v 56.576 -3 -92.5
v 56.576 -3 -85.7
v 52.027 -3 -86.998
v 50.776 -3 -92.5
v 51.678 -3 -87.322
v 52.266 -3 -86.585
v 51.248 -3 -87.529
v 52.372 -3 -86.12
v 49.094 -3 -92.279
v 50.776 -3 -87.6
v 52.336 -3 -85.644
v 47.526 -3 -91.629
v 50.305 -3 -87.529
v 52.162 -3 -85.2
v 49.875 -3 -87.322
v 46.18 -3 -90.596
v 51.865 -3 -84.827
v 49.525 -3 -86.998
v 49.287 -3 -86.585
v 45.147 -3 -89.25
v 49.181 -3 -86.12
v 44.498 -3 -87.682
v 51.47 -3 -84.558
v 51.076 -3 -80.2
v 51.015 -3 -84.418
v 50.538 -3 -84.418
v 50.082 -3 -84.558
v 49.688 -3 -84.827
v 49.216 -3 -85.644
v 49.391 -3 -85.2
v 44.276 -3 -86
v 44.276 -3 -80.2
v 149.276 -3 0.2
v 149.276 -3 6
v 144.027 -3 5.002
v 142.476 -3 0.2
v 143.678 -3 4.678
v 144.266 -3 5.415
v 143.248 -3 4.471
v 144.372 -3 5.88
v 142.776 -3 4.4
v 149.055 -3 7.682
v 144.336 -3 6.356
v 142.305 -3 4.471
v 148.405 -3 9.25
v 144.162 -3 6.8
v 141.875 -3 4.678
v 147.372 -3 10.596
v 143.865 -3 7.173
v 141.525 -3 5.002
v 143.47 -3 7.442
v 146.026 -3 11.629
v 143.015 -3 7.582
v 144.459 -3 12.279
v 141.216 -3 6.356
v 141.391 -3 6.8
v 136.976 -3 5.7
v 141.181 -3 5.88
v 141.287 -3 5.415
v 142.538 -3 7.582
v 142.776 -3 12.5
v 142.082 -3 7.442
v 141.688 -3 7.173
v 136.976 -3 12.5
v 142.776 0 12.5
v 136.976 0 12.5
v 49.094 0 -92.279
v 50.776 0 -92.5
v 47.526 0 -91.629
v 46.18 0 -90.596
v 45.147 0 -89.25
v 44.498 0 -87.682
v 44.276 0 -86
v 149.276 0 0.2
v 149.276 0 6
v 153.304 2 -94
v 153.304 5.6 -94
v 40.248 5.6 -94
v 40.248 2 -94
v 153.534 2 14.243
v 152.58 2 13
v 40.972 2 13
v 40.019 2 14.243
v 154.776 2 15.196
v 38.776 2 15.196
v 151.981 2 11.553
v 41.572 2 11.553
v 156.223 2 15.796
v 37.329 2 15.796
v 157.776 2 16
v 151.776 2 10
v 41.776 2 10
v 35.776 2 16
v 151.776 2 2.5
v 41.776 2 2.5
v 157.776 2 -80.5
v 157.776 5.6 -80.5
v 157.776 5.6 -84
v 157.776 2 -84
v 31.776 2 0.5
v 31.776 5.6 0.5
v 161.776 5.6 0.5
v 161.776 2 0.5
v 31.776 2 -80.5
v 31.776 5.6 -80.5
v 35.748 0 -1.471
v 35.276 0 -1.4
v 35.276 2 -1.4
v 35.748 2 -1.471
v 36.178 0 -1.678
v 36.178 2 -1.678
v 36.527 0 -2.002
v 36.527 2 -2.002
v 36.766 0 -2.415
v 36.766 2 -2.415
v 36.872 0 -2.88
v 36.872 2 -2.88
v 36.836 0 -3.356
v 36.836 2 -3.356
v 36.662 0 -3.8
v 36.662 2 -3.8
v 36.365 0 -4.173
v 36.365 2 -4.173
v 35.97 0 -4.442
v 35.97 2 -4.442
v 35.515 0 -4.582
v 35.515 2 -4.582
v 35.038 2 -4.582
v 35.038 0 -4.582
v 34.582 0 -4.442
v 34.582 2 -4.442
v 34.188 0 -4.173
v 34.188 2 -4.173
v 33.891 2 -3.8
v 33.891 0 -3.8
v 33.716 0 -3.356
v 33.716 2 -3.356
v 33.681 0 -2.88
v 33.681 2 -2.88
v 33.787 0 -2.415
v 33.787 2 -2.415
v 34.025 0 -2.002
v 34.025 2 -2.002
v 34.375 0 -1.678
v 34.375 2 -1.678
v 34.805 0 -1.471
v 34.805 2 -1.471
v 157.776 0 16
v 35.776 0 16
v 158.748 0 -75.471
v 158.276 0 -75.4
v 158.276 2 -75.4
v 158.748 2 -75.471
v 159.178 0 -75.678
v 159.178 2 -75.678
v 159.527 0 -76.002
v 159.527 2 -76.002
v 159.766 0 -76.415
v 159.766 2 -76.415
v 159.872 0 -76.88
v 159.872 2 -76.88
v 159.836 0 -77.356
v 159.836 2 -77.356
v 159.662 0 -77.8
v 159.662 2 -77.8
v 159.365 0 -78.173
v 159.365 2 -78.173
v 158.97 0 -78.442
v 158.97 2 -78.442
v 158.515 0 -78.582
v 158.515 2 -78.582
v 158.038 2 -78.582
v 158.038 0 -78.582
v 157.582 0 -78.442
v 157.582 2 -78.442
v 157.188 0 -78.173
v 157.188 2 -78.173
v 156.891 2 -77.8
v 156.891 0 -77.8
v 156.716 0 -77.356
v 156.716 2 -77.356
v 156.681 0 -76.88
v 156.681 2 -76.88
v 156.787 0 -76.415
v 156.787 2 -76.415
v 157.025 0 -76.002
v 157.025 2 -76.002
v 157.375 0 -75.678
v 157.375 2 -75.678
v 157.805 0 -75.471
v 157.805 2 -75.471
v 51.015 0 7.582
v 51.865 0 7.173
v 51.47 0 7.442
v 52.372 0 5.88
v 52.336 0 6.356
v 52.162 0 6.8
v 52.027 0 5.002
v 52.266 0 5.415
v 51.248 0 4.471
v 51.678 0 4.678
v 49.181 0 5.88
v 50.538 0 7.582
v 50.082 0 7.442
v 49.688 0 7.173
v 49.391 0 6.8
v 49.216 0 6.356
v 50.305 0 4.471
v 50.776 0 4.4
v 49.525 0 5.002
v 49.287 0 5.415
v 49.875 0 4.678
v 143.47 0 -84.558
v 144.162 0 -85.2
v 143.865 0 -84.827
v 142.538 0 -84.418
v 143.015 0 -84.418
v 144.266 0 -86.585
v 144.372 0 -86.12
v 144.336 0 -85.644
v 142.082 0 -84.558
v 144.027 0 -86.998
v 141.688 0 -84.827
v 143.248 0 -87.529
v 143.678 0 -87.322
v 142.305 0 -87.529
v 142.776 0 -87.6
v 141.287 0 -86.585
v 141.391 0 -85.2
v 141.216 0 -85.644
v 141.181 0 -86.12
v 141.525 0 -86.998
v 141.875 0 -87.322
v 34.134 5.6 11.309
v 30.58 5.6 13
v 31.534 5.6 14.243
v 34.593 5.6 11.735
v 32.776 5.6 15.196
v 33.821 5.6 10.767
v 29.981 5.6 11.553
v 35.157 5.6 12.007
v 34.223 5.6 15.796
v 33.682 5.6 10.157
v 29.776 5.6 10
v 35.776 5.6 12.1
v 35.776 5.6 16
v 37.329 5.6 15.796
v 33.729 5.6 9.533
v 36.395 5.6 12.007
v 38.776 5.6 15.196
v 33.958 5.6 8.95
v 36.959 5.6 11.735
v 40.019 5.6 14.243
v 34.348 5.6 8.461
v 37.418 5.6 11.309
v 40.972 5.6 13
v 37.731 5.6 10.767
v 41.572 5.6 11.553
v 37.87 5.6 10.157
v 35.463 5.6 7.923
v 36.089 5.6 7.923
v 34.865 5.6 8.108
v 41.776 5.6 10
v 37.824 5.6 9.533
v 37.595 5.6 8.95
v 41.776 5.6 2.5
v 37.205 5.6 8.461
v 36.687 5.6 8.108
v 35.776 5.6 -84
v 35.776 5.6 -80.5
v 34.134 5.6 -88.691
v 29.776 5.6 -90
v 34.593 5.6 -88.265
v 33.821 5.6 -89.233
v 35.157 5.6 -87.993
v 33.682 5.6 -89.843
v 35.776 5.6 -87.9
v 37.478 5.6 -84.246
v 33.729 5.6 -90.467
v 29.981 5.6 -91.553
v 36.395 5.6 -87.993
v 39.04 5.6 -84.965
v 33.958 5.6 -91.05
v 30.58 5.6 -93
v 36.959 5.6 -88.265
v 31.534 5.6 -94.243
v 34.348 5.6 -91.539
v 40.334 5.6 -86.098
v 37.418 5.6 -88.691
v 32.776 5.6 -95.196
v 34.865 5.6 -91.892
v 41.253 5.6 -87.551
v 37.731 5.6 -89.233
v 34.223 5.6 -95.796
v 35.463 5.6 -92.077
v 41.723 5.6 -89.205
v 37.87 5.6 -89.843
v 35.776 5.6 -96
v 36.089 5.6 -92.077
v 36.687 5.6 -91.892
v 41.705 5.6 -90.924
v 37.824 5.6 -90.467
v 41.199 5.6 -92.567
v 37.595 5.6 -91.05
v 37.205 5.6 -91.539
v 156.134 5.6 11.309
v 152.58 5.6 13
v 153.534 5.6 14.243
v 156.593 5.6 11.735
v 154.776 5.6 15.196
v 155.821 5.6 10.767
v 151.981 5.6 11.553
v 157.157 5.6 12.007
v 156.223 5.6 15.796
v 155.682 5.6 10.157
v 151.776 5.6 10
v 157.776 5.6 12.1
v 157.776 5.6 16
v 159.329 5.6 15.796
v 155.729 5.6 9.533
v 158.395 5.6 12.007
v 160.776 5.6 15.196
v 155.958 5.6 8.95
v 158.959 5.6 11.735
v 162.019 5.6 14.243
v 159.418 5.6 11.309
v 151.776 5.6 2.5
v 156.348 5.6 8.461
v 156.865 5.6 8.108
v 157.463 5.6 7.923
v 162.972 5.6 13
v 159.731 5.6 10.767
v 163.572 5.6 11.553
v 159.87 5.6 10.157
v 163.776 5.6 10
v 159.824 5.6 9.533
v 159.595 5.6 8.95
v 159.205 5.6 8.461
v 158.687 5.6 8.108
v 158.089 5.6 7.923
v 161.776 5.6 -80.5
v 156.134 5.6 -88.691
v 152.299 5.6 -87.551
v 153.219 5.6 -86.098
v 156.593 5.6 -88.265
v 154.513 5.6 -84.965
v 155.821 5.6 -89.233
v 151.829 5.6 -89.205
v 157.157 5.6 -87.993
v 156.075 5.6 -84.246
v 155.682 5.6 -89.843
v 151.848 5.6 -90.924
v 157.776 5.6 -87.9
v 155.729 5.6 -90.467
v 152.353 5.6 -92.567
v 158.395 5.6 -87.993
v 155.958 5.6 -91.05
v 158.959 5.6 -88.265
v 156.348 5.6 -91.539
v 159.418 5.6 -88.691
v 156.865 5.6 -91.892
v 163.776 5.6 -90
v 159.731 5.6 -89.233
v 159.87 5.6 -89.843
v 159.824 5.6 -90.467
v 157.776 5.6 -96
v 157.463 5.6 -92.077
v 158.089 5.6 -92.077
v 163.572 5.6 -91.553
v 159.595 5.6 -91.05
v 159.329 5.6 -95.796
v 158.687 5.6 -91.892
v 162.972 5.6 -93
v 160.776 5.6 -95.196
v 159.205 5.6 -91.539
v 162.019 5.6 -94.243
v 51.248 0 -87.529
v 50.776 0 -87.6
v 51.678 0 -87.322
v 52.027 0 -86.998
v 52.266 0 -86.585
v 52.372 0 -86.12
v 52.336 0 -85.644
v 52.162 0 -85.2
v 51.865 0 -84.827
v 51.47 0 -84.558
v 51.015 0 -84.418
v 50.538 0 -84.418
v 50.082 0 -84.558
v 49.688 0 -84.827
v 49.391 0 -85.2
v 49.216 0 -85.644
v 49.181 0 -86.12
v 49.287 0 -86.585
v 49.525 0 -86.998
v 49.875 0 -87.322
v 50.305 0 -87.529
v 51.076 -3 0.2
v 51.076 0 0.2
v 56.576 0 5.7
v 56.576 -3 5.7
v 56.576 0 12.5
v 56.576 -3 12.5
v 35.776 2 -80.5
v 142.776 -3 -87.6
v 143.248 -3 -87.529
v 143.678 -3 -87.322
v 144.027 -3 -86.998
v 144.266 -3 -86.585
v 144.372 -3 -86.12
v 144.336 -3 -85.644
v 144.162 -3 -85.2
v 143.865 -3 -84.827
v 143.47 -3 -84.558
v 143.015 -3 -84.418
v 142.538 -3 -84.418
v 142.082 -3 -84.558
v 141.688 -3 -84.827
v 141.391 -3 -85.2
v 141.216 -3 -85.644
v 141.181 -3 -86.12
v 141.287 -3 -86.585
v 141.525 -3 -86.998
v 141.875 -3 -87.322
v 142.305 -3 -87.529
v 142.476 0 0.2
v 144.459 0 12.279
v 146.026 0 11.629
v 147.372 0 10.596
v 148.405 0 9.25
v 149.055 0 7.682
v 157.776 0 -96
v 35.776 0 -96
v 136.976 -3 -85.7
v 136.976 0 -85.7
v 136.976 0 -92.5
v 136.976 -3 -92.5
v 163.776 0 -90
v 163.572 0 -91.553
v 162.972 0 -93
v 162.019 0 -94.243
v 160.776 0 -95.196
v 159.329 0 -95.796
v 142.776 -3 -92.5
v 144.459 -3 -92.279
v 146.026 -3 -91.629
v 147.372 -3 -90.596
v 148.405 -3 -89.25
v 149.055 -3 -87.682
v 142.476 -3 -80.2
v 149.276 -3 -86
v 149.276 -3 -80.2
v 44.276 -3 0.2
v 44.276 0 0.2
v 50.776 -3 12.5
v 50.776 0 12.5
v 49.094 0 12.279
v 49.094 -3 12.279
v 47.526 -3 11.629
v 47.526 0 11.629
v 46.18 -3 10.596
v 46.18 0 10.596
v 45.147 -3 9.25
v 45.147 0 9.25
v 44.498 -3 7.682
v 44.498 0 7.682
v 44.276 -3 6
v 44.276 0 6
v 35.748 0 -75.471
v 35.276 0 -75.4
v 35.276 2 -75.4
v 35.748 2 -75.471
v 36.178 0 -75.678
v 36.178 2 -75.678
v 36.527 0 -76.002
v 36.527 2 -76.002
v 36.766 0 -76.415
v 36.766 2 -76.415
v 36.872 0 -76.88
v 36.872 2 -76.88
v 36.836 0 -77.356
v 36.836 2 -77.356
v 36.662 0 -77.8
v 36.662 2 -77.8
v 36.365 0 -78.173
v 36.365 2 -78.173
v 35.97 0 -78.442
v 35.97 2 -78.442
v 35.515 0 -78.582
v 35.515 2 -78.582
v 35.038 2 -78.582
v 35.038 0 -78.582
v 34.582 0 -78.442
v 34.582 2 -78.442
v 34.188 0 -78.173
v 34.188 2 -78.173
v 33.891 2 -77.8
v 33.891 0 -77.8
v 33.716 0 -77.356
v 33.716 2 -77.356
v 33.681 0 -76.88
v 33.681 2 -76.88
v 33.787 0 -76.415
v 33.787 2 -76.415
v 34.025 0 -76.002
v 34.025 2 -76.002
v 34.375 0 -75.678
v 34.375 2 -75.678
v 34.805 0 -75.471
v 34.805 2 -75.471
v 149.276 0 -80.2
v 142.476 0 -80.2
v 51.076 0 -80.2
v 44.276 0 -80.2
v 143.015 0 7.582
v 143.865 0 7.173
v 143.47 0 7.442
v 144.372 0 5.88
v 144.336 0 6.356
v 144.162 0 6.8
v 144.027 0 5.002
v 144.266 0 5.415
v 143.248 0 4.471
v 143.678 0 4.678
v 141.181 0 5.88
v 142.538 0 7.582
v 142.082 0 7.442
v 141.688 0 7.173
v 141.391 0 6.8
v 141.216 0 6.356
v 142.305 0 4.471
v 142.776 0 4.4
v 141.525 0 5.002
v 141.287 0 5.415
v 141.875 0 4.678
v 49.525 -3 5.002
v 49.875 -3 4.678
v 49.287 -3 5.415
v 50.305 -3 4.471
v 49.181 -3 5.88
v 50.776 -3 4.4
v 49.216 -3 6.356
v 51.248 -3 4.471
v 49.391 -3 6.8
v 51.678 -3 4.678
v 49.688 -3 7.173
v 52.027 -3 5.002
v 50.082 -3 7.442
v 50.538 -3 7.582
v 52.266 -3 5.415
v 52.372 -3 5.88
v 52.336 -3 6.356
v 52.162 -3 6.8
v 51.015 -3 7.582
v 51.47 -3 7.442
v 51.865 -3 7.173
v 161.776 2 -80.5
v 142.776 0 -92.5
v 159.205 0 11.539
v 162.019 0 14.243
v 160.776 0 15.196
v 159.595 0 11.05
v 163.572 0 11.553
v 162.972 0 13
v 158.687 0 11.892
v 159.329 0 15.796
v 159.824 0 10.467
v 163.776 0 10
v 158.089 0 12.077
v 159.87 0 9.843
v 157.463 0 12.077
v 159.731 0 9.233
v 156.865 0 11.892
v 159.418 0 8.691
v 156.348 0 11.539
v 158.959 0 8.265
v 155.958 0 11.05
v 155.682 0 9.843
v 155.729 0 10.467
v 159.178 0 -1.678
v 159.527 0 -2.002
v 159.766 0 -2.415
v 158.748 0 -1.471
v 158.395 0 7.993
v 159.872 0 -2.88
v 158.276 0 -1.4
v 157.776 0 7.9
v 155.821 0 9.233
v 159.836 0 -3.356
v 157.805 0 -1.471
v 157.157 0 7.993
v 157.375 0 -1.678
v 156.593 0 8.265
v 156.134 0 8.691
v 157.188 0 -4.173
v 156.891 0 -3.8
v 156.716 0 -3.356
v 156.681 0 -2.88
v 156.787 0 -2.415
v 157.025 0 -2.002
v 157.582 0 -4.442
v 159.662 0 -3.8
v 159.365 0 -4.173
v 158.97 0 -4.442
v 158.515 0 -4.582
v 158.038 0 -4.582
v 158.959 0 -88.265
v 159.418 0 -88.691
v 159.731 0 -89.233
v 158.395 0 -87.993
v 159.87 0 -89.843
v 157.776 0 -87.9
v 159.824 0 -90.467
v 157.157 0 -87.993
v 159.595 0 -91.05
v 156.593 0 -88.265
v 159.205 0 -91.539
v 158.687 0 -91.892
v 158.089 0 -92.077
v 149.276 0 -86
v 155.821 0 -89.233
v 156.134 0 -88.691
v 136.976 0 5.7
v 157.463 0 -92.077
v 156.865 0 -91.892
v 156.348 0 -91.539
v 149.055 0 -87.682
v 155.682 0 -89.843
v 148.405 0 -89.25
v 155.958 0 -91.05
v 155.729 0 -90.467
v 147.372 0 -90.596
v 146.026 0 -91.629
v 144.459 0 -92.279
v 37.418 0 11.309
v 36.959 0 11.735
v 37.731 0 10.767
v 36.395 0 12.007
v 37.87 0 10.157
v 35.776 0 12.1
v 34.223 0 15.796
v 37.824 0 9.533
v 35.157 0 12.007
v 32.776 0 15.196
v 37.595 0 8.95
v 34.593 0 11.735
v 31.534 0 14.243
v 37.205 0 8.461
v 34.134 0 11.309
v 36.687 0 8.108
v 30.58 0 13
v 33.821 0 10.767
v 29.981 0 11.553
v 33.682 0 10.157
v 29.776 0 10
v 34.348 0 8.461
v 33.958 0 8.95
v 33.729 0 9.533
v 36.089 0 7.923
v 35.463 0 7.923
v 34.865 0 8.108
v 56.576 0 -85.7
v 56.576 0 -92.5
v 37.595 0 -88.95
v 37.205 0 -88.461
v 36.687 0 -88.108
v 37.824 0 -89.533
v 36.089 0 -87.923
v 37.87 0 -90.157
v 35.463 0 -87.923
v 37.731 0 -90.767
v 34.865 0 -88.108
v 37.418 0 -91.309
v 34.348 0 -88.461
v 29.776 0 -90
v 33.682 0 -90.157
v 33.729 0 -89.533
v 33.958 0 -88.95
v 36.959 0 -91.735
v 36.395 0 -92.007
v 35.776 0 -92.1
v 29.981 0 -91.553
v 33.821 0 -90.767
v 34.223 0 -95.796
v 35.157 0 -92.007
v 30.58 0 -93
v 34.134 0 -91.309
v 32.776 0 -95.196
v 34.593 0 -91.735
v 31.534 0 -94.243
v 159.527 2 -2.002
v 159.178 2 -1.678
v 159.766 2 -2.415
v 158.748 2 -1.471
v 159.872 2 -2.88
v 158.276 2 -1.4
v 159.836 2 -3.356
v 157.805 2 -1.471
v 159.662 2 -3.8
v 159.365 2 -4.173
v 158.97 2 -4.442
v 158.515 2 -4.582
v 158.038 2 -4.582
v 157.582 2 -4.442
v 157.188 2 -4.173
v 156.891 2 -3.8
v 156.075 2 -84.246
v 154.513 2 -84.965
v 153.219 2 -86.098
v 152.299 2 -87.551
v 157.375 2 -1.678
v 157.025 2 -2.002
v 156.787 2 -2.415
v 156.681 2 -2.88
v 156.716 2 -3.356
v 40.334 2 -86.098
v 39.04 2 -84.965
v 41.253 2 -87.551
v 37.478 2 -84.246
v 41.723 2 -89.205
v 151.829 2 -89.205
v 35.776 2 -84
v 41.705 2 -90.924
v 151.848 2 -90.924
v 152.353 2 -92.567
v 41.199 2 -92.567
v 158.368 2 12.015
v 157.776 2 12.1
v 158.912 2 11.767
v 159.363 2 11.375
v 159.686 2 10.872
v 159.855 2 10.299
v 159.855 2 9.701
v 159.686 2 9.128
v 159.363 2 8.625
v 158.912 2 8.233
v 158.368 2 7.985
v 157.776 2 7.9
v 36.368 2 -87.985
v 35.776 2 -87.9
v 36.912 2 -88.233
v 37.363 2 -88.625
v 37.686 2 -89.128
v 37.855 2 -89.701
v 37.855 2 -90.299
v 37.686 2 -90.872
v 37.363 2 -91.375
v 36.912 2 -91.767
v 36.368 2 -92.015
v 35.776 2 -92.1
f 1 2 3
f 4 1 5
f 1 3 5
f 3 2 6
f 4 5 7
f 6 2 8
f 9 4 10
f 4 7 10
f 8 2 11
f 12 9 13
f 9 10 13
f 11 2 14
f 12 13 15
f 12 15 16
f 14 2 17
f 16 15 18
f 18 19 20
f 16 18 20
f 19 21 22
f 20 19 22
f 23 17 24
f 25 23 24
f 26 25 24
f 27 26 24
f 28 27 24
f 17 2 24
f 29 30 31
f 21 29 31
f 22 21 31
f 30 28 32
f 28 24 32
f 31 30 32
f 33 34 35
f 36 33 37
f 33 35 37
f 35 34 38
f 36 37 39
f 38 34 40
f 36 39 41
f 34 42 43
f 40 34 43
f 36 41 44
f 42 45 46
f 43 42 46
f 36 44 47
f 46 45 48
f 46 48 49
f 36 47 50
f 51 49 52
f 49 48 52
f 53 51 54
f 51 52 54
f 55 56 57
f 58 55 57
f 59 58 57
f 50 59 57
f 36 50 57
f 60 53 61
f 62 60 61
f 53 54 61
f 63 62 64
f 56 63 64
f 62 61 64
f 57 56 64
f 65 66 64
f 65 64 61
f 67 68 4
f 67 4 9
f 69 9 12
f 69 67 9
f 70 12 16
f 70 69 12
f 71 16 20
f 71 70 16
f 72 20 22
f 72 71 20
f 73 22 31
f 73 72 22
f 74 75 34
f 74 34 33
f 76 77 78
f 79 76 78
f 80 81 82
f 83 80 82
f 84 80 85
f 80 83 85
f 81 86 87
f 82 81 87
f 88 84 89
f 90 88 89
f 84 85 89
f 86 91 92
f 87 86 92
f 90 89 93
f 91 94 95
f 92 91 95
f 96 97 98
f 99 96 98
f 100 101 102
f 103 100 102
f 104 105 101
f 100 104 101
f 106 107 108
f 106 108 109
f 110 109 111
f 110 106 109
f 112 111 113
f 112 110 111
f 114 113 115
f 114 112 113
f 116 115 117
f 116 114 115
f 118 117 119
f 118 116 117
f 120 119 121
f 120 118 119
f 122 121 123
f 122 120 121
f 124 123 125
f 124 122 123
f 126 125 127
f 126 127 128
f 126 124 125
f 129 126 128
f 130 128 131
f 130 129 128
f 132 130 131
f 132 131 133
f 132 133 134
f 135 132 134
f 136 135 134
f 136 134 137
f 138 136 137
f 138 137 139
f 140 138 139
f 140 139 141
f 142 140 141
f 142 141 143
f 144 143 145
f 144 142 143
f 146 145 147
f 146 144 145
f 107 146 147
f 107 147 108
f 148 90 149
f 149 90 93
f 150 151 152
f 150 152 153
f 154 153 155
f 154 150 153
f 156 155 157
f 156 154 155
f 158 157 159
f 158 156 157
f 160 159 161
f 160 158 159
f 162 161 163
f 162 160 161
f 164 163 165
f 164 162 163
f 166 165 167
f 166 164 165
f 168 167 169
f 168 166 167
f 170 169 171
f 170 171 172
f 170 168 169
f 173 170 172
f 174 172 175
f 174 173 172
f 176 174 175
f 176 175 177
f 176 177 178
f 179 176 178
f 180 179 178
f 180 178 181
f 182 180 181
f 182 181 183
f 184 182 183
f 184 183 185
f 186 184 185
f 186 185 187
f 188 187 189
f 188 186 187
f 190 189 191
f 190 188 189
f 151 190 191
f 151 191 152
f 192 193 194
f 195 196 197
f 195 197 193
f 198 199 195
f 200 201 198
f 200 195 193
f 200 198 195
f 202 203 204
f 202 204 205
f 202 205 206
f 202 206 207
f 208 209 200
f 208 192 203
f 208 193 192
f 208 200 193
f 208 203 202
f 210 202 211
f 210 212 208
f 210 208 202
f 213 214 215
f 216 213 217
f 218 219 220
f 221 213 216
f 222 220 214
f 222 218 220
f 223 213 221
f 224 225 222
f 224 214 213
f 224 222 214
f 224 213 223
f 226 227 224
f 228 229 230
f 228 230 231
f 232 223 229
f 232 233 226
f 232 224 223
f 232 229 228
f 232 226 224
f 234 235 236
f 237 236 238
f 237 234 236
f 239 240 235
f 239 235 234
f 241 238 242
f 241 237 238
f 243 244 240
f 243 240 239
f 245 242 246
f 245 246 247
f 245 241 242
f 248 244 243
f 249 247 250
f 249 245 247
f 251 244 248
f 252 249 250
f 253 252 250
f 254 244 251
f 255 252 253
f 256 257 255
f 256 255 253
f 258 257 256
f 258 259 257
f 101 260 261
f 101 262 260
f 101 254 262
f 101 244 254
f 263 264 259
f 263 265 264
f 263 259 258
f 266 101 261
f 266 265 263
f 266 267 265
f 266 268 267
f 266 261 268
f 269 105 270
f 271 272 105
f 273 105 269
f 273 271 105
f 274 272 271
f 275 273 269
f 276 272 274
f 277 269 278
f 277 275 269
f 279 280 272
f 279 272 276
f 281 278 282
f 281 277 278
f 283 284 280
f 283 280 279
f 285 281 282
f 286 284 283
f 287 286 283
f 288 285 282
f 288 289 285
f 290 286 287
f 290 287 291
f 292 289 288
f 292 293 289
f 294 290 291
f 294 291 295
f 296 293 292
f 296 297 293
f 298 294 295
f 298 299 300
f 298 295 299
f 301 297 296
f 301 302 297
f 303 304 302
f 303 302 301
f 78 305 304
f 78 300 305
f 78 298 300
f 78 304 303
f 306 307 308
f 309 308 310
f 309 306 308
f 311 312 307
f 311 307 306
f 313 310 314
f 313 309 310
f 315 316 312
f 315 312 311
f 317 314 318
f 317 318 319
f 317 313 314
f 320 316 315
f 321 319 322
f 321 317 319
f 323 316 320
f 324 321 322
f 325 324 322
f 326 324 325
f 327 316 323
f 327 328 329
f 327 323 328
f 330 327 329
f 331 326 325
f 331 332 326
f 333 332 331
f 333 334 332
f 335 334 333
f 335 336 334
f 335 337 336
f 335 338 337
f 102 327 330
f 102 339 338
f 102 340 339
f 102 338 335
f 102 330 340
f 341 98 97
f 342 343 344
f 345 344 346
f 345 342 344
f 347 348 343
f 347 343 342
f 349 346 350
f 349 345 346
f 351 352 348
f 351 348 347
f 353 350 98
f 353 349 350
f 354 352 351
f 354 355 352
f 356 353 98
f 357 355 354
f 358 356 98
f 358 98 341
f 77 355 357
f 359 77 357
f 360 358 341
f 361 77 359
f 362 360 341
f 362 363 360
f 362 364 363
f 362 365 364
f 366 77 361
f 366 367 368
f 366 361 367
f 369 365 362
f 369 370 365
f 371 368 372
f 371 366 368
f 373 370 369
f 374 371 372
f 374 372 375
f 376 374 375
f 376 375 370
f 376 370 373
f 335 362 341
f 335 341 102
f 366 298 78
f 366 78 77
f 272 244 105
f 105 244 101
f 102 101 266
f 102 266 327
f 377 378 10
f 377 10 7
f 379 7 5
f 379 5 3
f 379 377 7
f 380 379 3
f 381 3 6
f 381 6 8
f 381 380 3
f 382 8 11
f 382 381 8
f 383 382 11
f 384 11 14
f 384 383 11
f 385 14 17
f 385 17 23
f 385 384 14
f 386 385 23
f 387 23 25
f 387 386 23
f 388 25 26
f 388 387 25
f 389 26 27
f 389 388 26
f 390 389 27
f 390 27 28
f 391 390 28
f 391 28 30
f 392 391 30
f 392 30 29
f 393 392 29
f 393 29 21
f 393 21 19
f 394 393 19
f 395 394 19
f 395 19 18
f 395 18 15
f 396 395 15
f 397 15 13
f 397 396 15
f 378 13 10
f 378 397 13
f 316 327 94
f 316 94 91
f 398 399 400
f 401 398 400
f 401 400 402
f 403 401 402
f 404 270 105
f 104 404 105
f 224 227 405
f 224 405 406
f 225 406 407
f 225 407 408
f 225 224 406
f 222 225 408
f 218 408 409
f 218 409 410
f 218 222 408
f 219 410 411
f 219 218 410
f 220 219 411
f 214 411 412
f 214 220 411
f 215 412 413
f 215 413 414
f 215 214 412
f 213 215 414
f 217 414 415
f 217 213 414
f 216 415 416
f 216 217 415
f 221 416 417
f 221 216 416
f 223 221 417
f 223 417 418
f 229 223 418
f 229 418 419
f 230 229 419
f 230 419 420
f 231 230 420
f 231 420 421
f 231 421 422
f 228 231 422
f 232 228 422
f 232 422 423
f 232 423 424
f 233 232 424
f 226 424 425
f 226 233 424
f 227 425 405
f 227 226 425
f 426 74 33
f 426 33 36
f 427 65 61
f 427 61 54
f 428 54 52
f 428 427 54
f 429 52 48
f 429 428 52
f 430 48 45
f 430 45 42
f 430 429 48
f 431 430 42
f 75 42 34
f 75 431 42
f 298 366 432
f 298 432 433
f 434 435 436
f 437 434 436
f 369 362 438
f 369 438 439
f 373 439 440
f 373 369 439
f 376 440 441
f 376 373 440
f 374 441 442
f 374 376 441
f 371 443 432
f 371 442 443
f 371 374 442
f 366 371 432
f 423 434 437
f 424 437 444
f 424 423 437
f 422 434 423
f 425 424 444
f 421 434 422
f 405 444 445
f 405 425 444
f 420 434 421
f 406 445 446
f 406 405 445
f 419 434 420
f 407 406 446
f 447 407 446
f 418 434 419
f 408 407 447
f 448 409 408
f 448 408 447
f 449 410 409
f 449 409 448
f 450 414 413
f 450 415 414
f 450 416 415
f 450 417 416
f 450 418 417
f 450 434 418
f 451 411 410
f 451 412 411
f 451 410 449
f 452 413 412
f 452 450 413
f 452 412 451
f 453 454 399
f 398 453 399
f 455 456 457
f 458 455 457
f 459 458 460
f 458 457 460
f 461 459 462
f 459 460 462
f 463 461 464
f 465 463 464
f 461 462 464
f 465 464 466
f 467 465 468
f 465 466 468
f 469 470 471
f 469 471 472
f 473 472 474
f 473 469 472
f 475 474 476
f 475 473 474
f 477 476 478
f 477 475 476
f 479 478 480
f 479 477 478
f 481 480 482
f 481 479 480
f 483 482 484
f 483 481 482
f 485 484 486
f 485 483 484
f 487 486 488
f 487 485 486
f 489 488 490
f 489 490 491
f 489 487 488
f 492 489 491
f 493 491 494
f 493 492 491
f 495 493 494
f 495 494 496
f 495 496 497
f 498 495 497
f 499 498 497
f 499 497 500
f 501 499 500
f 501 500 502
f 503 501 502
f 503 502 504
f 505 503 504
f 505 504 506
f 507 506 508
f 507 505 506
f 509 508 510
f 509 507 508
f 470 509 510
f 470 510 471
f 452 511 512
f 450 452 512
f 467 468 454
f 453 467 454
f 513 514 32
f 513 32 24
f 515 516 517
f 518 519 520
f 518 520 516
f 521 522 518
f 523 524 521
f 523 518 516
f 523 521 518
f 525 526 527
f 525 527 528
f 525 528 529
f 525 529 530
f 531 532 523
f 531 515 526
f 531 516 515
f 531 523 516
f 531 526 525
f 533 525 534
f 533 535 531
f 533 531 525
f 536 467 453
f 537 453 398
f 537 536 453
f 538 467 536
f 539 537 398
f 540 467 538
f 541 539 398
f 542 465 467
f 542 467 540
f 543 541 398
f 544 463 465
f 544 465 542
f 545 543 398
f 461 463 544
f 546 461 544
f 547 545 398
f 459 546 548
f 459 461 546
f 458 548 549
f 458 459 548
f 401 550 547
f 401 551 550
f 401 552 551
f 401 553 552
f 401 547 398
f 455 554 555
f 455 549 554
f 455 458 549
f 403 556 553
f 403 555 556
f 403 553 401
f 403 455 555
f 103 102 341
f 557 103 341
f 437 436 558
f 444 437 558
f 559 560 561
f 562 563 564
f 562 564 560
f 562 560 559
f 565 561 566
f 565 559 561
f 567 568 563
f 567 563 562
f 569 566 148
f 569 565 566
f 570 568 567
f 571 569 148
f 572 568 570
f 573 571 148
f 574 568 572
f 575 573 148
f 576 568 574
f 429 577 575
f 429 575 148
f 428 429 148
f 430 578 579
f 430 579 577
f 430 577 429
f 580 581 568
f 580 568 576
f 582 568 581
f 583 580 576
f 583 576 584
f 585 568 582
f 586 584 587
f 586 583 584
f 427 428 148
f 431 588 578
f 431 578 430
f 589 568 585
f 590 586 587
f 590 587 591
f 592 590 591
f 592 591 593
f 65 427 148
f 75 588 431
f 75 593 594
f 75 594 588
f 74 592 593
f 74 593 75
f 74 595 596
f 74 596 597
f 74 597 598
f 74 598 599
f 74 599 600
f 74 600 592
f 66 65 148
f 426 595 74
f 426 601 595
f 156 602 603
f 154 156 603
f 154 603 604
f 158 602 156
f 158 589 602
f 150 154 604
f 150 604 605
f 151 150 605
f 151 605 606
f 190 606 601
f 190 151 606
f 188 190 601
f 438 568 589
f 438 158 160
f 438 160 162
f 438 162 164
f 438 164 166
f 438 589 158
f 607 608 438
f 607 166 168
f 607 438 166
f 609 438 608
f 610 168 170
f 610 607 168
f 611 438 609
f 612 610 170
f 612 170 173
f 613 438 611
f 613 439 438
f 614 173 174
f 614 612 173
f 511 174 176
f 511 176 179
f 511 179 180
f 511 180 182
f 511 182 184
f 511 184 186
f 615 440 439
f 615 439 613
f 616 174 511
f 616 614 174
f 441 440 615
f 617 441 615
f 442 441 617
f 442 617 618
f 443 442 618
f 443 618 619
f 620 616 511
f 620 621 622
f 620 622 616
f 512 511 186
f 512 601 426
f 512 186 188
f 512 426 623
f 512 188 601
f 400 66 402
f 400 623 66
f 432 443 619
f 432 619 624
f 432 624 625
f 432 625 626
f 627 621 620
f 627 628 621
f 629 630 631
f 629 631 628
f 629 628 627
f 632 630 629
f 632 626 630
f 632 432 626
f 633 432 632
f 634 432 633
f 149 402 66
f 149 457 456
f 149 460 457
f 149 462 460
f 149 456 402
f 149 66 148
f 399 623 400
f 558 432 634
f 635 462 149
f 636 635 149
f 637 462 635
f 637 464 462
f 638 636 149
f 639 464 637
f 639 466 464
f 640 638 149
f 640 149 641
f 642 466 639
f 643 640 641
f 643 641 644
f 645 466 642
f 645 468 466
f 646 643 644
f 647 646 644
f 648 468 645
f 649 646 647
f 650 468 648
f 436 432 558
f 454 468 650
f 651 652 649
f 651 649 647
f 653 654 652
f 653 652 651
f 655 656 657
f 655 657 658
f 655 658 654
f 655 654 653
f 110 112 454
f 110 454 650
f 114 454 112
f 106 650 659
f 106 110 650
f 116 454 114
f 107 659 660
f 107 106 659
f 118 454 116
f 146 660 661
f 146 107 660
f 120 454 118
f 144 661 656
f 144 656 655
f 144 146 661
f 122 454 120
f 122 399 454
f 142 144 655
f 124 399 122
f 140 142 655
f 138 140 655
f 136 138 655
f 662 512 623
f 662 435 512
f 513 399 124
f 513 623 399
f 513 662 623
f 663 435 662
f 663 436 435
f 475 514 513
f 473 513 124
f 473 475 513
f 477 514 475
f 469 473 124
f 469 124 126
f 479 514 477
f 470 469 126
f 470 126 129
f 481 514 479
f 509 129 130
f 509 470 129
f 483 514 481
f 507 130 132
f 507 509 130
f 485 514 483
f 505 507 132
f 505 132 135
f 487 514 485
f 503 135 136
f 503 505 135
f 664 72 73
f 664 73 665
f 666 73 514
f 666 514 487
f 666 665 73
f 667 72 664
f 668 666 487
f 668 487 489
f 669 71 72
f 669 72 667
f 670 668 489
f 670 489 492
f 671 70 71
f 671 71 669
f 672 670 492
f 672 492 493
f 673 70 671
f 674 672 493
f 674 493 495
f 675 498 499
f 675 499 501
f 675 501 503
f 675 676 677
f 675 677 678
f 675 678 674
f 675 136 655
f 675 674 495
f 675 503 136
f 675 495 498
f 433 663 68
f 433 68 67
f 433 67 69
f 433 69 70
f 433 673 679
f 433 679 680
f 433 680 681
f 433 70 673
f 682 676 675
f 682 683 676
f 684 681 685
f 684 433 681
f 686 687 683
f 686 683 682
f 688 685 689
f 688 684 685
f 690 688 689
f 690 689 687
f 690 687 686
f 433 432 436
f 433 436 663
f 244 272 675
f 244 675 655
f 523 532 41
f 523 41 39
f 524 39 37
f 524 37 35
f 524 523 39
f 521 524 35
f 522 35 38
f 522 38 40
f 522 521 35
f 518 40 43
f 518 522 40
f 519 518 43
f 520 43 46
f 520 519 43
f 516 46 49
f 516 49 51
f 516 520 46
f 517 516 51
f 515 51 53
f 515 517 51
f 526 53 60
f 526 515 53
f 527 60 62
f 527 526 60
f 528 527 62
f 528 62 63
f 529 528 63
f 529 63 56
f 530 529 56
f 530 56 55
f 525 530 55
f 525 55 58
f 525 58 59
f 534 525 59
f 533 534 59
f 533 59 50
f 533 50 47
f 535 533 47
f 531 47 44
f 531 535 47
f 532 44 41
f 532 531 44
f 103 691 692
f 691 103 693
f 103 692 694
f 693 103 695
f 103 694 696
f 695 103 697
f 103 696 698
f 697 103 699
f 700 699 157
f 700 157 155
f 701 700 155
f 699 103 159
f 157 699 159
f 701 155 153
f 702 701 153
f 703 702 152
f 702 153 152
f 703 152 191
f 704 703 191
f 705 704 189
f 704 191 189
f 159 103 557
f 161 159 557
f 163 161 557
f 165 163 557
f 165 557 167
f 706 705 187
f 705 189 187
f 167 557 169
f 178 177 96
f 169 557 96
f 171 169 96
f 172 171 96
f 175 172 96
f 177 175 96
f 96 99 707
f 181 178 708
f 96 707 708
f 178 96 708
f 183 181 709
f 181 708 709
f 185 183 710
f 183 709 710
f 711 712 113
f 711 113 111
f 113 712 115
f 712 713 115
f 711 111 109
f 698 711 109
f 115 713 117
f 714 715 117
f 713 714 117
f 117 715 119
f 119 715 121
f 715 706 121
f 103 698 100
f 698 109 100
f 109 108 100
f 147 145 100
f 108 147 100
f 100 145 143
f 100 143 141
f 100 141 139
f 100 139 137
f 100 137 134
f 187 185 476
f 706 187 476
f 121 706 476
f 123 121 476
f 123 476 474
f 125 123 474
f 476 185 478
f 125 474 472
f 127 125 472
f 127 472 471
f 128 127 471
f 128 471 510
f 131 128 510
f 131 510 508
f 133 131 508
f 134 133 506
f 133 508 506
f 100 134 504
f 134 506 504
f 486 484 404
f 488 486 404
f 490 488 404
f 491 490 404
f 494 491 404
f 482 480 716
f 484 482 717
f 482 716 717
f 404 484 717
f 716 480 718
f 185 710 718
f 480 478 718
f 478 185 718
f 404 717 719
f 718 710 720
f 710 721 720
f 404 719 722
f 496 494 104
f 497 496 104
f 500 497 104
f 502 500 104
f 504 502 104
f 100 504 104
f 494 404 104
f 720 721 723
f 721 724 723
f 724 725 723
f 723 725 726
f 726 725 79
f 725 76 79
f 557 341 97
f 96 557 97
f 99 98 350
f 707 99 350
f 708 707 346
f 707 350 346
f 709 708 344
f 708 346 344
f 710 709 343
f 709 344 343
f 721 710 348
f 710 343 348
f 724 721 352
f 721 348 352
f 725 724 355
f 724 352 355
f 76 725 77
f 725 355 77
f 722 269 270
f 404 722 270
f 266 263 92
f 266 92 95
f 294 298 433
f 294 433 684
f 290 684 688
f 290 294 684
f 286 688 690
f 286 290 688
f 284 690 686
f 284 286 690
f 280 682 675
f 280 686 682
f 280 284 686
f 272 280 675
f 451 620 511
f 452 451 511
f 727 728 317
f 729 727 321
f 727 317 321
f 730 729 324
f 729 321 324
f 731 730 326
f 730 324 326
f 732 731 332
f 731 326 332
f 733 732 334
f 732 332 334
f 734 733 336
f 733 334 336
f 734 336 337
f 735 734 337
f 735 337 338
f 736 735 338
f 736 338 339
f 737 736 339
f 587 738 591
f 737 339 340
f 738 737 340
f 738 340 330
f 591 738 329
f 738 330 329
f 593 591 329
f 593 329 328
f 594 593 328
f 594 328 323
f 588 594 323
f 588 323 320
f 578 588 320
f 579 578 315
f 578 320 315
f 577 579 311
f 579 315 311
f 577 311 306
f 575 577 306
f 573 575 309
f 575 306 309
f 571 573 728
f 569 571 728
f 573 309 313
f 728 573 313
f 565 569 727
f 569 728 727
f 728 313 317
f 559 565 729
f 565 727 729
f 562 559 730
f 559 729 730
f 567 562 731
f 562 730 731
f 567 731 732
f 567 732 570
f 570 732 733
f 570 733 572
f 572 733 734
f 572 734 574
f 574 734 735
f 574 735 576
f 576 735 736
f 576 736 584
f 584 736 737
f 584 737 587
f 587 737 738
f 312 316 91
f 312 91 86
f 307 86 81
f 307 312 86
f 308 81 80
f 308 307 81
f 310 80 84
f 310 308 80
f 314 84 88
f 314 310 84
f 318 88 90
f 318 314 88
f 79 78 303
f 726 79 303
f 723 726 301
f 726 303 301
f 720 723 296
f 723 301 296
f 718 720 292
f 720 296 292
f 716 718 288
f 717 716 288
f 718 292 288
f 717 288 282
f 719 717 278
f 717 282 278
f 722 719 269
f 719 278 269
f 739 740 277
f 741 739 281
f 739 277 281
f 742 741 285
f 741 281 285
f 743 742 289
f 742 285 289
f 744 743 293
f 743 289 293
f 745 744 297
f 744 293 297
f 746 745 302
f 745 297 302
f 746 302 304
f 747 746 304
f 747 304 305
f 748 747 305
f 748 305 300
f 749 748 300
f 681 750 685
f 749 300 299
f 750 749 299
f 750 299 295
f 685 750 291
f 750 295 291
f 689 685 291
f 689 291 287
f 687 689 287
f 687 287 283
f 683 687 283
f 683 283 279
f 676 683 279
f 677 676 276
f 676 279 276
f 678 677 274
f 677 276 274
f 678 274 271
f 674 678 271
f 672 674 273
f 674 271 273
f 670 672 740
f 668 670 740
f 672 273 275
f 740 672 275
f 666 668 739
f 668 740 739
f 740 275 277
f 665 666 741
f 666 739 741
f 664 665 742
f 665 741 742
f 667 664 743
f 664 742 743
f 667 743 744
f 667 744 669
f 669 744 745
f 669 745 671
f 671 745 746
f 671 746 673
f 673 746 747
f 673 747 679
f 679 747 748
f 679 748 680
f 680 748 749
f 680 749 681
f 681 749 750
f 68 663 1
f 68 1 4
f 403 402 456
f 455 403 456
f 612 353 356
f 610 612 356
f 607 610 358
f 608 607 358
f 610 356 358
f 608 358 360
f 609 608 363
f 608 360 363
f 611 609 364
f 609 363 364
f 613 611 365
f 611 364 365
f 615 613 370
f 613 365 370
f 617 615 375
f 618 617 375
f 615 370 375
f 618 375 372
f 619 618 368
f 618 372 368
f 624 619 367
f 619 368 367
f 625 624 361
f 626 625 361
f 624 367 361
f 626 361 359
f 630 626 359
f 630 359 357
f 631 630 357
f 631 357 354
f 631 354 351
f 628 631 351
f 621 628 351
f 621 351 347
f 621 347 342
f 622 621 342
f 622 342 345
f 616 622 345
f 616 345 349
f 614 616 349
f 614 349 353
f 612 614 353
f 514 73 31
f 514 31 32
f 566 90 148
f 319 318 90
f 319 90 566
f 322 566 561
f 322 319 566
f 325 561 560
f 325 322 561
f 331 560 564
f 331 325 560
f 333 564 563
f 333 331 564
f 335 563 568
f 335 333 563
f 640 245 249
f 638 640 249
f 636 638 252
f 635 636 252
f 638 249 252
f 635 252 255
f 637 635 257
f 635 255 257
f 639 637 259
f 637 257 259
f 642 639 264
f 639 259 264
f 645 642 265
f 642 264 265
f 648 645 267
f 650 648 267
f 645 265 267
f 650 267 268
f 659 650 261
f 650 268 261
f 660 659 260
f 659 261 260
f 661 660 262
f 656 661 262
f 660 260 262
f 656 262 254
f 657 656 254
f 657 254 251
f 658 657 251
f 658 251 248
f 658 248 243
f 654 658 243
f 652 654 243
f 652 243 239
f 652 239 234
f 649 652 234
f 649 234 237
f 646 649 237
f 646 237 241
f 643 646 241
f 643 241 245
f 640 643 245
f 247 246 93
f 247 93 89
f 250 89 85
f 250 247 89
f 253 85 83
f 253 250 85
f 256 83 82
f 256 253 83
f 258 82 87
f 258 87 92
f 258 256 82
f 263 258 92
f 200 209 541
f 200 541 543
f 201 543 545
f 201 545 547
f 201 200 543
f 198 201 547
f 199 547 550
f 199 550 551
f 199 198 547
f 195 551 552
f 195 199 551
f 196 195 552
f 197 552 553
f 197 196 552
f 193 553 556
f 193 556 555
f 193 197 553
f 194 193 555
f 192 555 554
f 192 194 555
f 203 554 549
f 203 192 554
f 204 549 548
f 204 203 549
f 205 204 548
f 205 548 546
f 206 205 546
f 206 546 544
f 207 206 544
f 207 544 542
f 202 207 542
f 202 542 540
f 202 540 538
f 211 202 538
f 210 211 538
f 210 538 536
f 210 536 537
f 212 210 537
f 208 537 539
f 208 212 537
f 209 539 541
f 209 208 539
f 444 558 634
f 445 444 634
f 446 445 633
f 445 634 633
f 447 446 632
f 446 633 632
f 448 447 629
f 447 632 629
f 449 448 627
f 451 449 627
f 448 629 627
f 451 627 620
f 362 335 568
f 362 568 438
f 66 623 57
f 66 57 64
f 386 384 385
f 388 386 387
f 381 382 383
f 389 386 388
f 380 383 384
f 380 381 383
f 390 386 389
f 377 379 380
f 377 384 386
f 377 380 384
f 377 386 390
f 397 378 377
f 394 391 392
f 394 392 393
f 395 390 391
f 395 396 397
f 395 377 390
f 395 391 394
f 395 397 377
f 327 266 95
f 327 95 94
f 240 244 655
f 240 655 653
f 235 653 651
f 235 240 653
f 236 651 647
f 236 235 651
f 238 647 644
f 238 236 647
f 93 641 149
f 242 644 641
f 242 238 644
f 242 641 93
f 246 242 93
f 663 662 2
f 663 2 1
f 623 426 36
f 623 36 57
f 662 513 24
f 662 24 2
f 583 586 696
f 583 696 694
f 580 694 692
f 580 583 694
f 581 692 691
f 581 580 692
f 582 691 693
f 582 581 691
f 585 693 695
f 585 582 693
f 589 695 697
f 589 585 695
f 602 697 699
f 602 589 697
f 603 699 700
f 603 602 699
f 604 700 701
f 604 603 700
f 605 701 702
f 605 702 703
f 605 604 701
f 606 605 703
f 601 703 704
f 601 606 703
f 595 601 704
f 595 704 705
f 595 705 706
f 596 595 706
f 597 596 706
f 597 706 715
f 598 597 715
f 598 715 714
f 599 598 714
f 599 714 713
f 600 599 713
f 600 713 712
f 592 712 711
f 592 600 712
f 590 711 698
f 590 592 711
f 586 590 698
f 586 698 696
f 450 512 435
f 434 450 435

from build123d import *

# Parameters (mm, degrees)
SKETCH_1_W      = 129
SKETCH_1_H      = 80
SKETCH_1_R      = 1.6
EXTRUDE_1_DEPTH = 2
SKETCH_2_R      = 2.1
SKETCH_2_W      = 129
SKETCH_2_H      = 80
EXTRUDE_2_DEPTH = 2
EXTRUDE_START   = 3.6
SKETCH_3_R      = 2.1
EXTRUDE_3_DEPTH = 3.6
SKETCH_4_R      = 1.6
EXTRUDE_4_DEPTH = 3


with BuildPart() as part:
    # 草图1 → 凸台-拉伸1 (new body)
    with BuildSketch(Plane(origin=(0, 0, 0), x_dir=(1, 0, 0), z_dir=(0, 1, 0))):
        with Locations((96.776260997, 40)):
            Rectangle(SKETCH_1_W, SKETCH_1_H)
        with Locations(Location((35.276260997, 77, 0), (0, 0, 270))):
            Circle(SKETCH_1_R, mode=Mode.SUBTRACT)
        with Locations(Location((158.276260997, 77, 0), (0, 0, 270))):
            Circle(SKETCH_1_R, mode=Mode.SUBTRACT)
        with Locations(Location((158.276260997, 3, 0), (0, 0, 270))):
            Circle(SKETCH_1_R, mode=Mode.SUBTRACT)
        with Locations(Location((35.276260997, 3, 0), (0, 0, 270))):
            Circle(SKETCH_1_R, mode=Mode.SUBTRACT)
    extrude(amount=EXTRUDE_1_DEPTH)

    # 草图2 → 凸台-拉伸2 (add)
    with BuildSketch(Plane(origin=(0, 2, 0), x_dir=(1, 0, 0), z_dir=(0, 1, 0))):
        with BuildLine():
            Line((35.776260997, 96), (157.776260997, 96))
            ThreePointArc((157.776260997, 96), (162.018901684, 94.242640687), (163.776260997, 90))
            Line((163.776260997, 90), (163.776260997, -10))
            ThreePointArc((163.776260997, -10), (162.018901684, -14.242640687), (157.776260997, -16))
            Line((157.776260997, -16), (35.776260997, -16))
            ThreePointArc((35.776260997, -16), (31.53362031, -14.242640687), (29.776260997, -10))
            Line((29.776260997, -10), (29.776260997, 90))
            ThreePointArc((29.776260997, 90), (31.53362031, 94.242640687), (35.776260997, 96))
        make_face()
        with Locations(Location((35.776260997, -10, 0), (0, 0, 270))):
            Circle(SKETCH_2_R, mode=Mode.SUBTRACT)
        with Locations(Location((157.776260997, -10, 0), (0, 0, 90))):
            Circle(SKETCH_2_R, mode=Mode.SUBTRACT)
        with Locations(Location((157.776260997, 90, 0), (0, 0, 270))):
            Circle(SKETCH_2_R, mode=Mode.SUBTRACT)
        with Locations(Location((35.776260997, 90, 0), (0, 0, 90))):
            Circle(SKETCH_2_R, mode=Mode.SUBTRACT)
        with Locations((96.776260997, 40)):
            Rectangle(SKETCH_2_W, SKETCH_2_H, mode=Mode.SUBTRACT)
    extrude(amount=-EXTRUDE_2_DEPTH)

    # 草图3 → 凸台-拉伸3 (add)
    with BuildSketch(Plane(origin=(0, 2, 0), x_dir=(1, 0, 0), z_dir=(0, 1, 0)).offset(EXTRUDE_START)):
        with BuildLine():
            Line((41.776260997, -10), (41.776260997, -2.5))
            Line((41.776260997, -2.5), (151.776260997, -2.5))
            Line((151.776260997, -2.5), (151.776260997, -10))
            ThreePointArc((151.776260997, -10), (153.53362031, -14.242640687), (157.776260997, -16))
            ThreePointArc((157.776260997, -16), (162.018901684, -14.242640687), (163.776260997, -10))
            Line((163.776260997, -10), (163.776260997, 90))
            ThreePointArc((163.776260997, 90), (162.018901684, 94.242640687), (157.776260997, 96))
            Line((157.776260997, 96), (35.776260997, 96))
            ThreePointArc((35.776260997, 96), (31.53362031, 94.242640687), (29.776260997, 90))
            Line((29.776260997, 90), (29.776260997, -10))
            ThreePointArc((29.776260997, -10), (31.53362031, -14.242640687), (35.776260997, -16))
            ThreePointArc((35.776260997, -16), (40.018901684, -14.242640687), (41.776260997, -10))
        make_face()
        with Locations(Location((35.776260997, -10, 0), (0, 0, 270))):
            Circle(SKETCH_3_R, mode=Mode.SUBTRACT)
        with Locations(Location((35.776260997, 90, 0), (0, 0, 270))):
            Circle(SKETCH_3_R, mode=Mode.SUBTRACT)
        with Locations(Location((157.776260997, 90, 0), (0, 0, 270))):
            Circle(SKETCH_3_R, mode=Mode.SUBTRACT)
        with Locations(Location((157.776260997, -10, 0), (0, 0, 270))):
            Circle(SKETCH_3_R, mode=Mode.SUBTRACT)
        with BuildLine():
            Line((31.776260997, -0.5), (161.776260997, -0.5))
            Line((161.776260997, -0.5), (161.776260997, 80.5))
            Line((161.776260997, 80.5), (157.776260997, 80.5))
            Line((157.776260997, 80.5), (157.776260997, 84))
            ThreePointArc((157.776260997, 84), (152.299035422, 87.550510257), (153.304125042, 94))
            Line((153.304125042, 94), (96.776260997, 94))
            Line((96.776260997, 94), (40.248396952, 94))
            ThreePointArc((40.248396952, 94), (41.253486572, 87.550510257), (35.776260997, 84))
            Line((35.776260997, 84), (35.776260997, 80.5))
            Line((35.776260997, 80.5), (31.776260997, 80.5))
            Line((31.776260997, 80.5), (31.776260997, -0.5))
        make_face(mode=Mode.SUBTRACT)
    extrude(amount=-EXTRUDE_3_DEPTH)

    # 草图4 → 凸台-拉伸4 (add)
    # profile 1 of 4: a face of its own
    with BuildSketch(Plane.XZ):
        with BuildLine():
            Line((149.276260997, -80.2), (142.476260997, -80.2))
            Line((142.476260997, -80.2), (136.976260997, -85.7))
            Line((136.976260997, -85.7), (136.976260997, -92.5))
            Line((136.976260997, -92.5), (142.776260997, -92.5))
            ThreePointArc((142.776260997, -92.5), (147.372455074, -90.596194078), (149.276260997, -86))
            Line((149.276260997, -86), (149.276260997, -80.2))
        make_face()
        with Locations(Location((142.776260997, -86, 0), (0, 0, 270))):
            Circle(SKETCH_4_R, mode=Mode.SUBTRACT)
    # profile 2 of 4: a face of its own
    with BuildSketch(Plane.XZ):
        with BuildLine():
            Line((56.576260997, -92.5), (50.776260997, -92.5))
            ThreePointArc((50.776260997, -92.5), (46.180066919, -90.596194078), (44.276260997, -86))
            Line((44.276260997, -86), (44.276260997, -80.2))
            Line((44.276260997, -80.2), (51.076260997, -80.2))
            Line((51.076260997, -80.2), (56.576260997, -85.7))
            Line((56.576260997, -85.7), (56.576260997, -92.5))
        make_face()
        with Locations(Location((50.776260997, -86, 0), (0, 0, 270))):
            Circle(SKETCH_4_R, mode=Mode.SUBTRACT)
    # profile 3 of 4: a face of its own
    with BuildSketch(Plane.XZ):
        with BuildLine():
            Line((136.976260997, 12.5), (142.776260997, 12.5))
            ThreePointArc((142.776260997, 12.5), (147.372455074, 10.596194078), (149.276260997, 6))
            Line((149.276260997, 6), (149.276260997, 0.2))
            Line((149.276260997, 0.2), (142.476260997, 0.2))
            Line((142.476260997, 0.2), (136.976260997, 5.7))
            Line((136.976260997, 5.7), (136.976260997, 12.5))
        make_face()
        with Locations(Location((142.776260997, 6, 0), (0, 0, 270))):
            Circle(SKETCH_4_R, mode=Mode.SUBTRACT)
    # profile 4 of 4: a face of its own
    with BuildSketch(Plane.XZ):
        with BuildLine():
            Line((44.276260997, 0.2), (51.076260997, 0.2))
            Line((51.076260997, 0.2), (56.576260997, 5.7))
            Line((56.576260997, 5.7), (56.576260997, 12.5))
            Line((56.576260997, 12.5), (50.776260997, 12.5))
            ThreePointArc((50.776260997, 12.5), (46.180066919, 10.596194078), (44.276260997, 6))
            Line((44.276260997, 6), (44.276260997, 0.2))
        make_face()
        with Locations(Location((50.776260997, 6, 0), (0, 0, 270))):
            Circle(SKETCH_4_R, mode=Mode.SUBTRACT)
    extrude(amount=EXTRUDE_4_DEPTH)


solid = part.part
